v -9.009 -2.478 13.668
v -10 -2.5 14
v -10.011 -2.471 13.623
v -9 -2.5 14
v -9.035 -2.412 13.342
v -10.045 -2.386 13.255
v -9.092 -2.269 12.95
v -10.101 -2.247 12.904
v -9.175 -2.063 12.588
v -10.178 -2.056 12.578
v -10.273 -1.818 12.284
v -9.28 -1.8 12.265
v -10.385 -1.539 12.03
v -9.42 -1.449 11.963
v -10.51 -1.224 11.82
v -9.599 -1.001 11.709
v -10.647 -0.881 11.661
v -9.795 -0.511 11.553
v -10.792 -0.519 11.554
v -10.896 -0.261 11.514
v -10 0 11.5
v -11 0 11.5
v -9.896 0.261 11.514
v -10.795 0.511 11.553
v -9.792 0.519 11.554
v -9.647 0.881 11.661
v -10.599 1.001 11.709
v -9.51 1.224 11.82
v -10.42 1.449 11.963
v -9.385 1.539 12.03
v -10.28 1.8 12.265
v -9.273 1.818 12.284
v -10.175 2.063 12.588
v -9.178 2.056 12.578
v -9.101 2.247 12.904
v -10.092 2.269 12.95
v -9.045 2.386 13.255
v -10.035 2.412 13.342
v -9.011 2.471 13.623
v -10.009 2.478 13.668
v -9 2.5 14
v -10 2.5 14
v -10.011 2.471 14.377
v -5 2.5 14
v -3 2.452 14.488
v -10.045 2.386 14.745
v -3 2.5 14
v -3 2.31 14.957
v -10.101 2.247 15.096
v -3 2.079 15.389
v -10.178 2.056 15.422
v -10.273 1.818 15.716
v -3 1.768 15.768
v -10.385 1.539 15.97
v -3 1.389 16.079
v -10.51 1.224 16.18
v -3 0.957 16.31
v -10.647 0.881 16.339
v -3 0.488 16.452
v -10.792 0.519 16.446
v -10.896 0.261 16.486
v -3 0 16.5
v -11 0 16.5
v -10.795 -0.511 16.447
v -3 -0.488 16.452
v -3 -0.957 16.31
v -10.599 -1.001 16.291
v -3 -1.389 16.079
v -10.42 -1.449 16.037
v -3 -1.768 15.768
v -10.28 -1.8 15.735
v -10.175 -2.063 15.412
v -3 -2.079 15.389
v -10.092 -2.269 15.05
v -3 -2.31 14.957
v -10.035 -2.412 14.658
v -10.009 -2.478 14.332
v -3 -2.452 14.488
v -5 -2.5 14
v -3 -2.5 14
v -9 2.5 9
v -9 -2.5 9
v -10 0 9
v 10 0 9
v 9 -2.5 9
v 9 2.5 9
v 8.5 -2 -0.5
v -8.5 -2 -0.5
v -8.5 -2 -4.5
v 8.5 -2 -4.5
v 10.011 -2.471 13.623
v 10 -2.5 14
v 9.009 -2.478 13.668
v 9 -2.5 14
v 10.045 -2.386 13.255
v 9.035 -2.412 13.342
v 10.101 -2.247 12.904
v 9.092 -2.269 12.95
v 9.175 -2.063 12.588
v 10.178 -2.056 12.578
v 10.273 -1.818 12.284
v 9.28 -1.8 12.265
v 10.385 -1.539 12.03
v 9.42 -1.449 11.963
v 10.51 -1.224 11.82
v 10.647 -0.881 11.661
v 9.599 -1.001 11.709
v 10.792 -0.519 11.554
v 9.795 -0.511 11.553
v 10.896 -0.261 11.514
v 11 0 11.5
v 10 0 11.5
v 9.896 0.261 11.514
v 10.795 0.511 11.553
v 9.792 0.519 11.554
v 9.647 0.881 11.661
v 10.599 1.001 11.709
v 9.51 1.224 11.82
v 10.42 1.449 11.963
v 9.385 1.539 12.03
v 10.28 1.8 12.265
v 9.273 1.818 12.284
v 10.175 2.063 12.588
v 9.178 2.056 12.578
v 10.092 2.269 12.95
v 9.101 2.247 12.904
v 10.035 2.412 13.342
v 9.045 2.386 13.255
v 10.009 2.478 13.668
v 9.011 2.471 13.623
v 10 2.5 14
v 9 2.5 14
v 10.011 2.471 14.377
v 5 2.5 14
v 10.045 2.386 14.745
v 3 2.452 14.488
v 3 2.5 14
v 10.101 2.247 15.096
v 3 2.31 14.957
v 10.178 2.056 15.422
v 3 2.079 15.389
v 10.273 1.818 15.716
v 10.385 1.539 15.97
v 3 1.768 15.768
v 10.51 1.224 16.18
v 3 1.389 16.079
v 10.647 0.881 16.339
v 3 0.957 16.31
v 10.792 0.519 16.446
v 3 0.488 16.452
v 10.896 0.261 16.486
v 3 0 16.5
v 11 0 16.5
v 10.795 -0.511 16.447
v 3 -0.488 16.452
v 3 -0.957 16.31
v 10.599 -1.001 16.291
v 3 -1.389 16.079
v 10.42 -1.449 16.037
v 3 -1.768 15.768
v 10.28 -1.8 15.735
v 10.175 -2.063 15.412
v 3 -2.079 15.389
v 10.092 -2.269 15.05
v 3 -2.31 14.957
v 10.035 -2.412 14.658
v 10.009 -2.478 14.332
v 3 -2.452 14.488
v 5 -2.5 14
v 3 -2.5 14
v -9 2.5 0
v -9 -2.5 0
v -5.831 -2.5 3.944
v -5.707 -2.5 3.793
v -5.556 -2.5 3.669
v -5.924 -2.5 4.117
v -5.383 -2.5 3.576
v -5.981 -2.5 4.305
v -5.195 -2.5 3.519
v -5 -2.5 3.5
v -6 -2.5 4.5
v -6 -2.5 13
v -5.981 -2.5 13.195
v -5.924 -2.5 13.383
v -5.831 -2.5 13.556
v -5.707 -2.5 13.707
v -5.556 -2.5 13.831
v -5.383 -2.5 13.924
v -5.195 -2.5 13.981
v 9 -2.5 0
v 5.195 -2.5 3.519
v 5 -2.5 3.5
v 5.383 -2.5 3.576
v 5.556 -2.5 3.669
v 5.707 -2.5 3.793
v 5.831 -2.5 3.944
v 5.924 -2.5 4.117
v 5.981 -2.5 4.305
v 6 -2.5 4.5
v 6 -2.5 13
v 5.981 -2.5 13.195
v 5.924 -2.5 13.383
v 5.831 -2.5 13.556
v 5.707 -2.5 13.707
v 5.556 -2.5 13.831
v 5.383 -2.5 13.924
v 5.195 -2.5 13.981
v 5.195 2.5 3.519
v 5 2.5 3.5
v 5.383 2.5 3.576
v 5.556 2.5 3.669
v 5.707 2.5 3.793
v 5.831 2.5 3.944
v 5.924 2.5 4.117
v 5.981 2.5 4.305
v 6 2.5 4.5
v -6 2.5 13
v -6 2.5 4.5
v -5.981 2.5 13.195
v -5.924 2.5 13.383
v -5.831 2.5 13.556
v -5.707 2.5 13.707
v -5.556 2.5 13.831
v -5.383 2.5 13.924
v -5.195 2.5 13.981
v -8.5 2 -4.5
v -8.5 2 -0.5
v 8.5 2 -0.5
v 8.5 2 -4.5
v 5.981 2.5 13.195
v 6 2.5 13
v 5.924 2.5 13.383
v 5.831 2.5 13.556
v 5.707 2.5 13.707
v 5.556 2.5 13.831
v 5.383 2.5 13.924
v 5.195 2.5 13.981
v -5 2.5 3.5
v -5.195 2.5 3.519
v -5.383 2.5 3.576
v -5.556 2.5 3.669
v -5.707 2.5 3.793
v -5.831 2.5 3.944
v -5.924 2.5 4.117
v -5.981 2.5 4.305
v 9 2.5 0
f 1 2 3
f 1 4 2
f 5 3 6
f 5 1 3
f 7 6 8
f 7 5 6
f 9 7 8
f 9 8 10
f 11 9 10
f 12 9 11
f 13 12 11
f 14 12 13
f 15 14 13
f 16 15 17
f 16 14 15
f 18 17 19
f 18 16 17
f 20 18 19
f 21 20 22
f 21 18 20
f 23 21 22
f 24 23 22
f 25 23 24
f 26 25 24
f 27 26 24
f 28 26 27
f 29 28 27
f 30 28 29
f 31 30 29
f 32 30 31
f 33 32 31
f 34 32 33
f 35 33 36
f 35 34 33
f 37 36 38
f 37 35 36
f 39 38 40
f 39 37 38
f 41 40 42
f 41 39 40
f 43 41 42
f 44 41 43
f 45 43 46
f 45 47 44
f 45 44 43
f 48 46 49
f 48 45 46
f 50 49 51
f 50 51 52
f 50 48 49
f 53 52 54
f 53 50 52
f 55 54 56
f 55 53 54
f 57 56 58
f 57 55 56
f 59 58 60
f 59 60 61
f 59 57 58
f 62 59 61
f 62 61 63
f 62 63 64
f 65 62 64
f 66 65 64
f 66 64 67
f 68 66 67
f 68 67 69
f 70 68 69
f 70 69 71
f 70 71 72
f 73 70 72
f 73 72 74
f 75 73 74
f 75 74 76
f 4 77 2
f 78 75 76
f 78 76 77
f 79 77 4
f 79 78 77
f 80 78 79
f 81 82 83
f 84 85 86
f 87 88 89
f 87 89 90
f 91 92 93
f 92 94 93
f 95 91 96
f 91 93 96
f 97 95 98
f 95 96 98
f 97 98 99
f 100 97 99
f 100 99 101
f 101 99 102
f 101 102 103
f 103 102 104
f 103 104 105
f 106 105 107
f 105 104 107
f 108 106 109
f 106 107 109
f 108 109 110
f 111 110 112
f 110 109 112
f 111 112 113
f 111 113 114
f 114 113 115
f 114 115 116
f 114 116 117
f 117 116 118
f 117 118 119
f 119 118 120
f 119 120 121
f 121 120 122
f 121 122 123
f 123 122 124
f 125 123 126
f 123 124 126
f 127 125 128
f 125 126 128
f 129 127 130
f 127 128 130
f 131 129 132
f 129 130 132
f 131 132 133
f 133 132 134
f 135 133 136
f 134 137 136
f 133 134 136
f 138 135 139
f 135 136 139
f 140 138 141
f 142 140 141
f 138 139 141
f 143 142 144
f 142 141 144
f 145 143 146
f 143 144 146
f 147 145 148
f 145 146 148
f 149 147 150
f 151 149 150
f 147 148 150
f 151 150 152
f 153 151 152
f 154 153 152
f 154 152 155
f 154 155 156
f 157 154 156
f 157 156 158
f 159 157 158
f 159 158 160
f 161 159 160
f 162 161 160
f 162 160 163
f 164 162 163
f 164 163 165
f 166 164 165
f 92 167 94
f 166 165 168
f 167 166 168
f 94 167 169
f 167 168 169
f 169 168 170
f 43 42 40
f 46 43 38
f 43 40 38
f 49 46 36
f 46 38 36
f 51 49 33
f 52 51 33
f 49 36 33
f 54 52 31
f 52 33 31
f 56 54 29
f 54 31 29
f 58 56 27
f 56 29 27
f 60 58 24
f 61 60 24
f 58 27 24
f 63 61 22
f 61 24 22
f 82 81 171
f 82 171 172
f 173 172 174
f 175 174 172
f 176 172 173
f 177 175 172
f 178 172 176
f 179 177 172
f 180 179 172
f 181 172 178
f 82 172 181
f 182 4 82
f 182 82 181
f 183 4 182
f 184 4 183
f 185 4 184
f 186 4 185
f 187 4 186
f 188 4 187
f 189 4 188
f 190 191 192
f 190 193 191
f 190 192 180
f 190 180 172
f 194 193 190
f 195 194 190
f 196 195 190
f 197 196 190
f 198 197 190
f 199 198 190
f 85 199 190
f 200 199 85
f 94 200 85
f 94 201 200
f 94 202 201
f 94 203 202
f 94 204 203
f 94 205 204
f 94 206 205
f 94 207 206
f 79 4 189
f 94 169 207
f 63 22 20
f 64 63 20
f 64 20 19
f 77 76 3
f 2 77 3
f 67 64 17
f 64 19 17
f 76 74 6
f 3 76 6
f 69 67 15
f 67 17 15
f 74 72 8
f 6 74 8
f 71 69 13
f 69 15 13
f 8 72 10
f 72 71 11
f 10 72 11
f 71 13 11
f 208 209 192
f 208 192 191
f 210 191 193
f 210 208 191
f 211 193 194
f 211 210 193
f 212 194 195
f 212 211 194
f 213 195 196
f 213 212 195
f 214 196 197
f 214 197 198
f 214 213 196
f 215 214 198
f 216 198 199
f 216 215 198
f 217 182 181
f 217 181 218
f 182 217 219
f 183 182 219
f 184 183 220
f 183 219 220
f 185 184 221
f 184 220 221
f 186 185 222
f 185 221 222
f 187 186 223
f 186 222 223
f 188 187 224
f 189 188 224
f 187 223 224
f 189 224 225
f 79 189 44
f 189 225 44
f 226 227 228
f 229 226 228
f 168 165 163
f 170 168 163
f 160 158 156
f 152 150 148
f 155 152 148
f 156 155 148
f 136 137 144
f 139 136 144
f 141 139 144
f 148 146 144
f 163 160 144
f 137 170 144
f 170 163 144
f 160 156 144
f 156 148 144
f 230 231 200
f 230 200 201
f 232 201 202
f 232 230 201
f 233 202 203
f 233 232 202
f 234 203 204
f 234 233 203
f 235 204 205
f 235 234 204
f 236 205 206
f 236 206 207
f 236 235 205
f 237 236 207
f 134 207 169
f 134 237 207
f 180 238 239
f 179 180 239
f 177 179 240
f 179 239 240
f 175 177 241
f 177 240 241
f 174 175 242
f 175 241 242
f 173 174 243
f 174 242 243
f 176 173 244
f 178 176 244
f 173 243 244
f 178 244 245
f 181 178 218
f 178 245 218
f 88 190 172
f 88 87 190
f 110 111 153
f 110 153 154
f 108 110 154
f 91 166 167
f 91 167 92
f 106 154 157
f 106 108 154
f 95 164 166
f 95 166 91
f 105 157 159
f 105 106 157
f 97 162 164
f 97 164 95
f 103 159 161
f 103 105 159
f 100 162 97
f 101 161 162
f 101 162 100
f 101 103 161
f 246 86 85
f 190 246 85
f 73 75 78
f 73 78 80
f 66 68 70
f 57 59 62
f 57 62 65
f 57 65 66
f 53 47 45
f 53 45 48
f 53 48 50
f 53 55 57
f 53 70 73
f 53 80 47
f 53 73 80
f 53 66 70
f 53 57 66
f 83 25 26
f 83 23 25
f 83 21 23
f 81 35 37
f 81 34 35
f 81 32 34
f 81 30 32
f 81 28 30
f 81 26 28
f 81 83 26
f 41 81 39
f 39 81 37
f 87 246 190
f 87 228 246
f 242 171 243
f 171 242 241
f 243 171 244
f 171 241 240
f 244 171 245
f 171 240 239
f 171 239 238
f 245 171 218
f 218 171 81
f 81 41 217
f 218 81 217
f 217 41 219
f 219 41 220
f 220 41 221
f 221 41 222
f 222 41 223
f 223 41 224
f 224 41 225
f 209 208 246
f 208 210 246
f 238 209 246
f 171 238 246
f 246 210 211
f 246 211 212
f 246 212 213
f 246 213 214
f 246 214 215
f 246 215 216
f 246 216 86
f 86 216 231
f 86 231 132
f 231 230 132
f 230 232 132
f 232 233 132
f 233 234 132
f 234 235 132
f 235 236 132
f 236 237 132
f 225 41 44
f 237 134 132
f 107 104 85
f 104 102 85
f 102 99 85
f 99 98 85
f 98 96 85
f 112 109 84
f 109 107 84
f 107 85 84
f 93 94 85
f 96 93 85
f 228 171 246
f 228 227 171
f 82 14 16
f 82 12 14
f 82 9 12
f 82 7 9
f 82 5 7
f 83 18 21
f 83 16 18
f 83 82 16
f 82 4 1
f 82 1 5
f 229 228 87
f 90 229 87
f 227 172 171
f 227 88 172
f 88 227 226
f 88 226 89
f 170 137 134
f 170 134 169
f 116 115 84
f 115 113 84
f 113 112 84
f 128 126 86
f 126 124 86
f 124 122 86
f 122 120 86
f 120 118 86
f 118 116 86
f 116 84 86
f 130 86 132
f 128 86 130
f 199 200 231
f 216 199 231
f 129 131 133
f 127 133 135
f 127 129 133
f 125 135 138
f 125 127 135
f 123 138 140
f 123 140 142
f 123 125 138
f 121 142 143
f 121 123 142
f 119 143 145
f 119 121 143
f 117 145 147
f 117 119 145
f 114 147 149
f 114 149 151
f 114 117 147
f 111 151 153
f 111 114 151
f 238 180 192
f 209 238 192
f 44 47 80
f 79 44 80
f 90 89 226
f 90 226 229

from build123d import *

# Parameters (mm, degrees)
F2_DEPTH    = 2.5
F3_DEPTH    = 10
F4_DEPTH    = 3
F5_DEPTH    = 6
F6_T1_DEPTH = 5
F8_DEPTH    = 14
F9_DEPTH    = 9
F10_DEPTH   = 1
F11_DEPTH   = 16.5
F12_FACE_W  = 18
F12_FACE_H  = 5
F13_DEPTH   = 0.5
F13_TAPER   = 45
F14_DEPTH   = 4


# Not quite as in the source:
# - a fillet or chamfer that OpenCascade refuses, or shapes differently, is made with other operations: its cross-section is extruded or revolved along the edge and cut away or added


with BuildPart() as f2:
    # F0 (on Front) → F2 (new body, symmetric)
    with BuildSketch(Plane.XZ):
        Polygon((0, 3.5), (0, 0), (9, 0), (9, 14), (6, 14), (6, 3.5), align=None)
    extrude(amount=F2_DEPTH, both=True)

    # F1 (on Right) → F3 (join)
    with BuildSketch(Plane.YZ):
        with BuildLine():
            Line((-2.5, 14), (2.5, 14))
            ThreePointArc((2.5, 14), (0, 16.5), (-2.5, 14))
        make_face()
        with BuildLine():
            ThreePointArc((-2.5, 14), (0, 11.5), (2.5, 14))
            Line((2.5, 14), (-2.5, 14))
        make_face()
    extrude(amount=F3_DEPTH)

    # F1 (on Right) → F4 (cut)
    with BuildSketch(Plane.YZ):
        with BuildLine():
            Line((-2.5, 14), (2.5, 14))
            ThreePointArc((2.5, 14), (0, 16.5), (-2.5, 14))
        make_face()
        with BuildLine():
            ThreePointArc((-2.5, 14), (0, 11.5), (2.5, 14))
            Line((2.5, 14), (-2.5, 14))
        make_face()
    extrude(amount=F4_DEPTH, mode=Mode.SUBTRACT)

    # F1 (on Right) → F5 (cut)
    with BuildSketch(Plane.YZ):
        with BuildLine():
            ThreePointArc((-2.5, 14), (0, 11.5), (2.5, 14))
            Line((2.5, 14), (-2.5, 14))
        make_face()
    extrude(amount=F5_DEPTH, mode=Mode.SUBTRACT)

    # F6: fillet of radius 1 on 2 edges, made by hand

    # F6_s2 → F6_t1 (join)
    with BuildSketch(Plane.XZ.offset(-2.5)):
        with BuildLine():
            ThreePointArc((6, 13), (5.7071067812, 13.7071067812), (5, 14))
            Line((5, 14), (6, 14))
            Line((6, 14), (6, 13))
        make_face()
        with BuildLine():
            ThreePointArc((5, 3.5), (5.7071067812, 3.7928932188), (6, 4.5))
            Line((6, 4.5), (6, 3.5))
            Line((6, 3.5), (5, 3.5))
        make_face()
    extrude(amount=F6_T1_DEPTH)

    # F7 (on Top) → F8 (join)
    with BuildSketch(Plane.XY):
        Polygon((9, 2.5), (9, -2.5), (10, 0), align=None)
    extrude(amount=F8_DEPTH)

    # F7 (on Top) → F9 (cut)
    with BuildSketch(Plane.XY):
        Polygon((9, 2.5), (9, -2.5), (10, 0), align=None)
    extrude(amount=F9_DEPTH, mode=Mode.SUBTRACT)

    # F10 (add): a face of the model
    f10_faces = [f2.faces().sort_by_distance(p)[0] for p in [
        (10, -1.717766953, 12.282233047),
    ]]
    extrude(f10_faces, amount=F10_DEPTH)

    # F7 (on Top) → F11 (cut)
    with BuildSketch(Plane.XY):
        Polygon((11, 0), (10, -2.5), (11.5, -2.5), (11.5, 2.5), (10, 2.5), align=None)
    extrude(amount=F11_DEPTH, mode=Mode.SUBTRACT)

    # F12: F2 across face


with BuildPart() as f2_1:
    add(f2.part)
    add(f2.part.mirror(Plane(origin=(0, 0, 1.75), x_dir=(0, -1, 0), z_dir=(-1, 0, 0))))

    # F12_face (on face) → F13 (join)
    with BuildSketch(Plane(origin=(0, 0, 0), x_dir=(1, 0, 0), z_dir=(0, 0, -1))):
        Rectangle(F12_FACE_W, F12_FACE_H)
    extrude(amount=F13_DEPTH, taper=F13_TAPER)

    # F14 (add): a face of the model
    f14_faces = [f2_1.faces().sort_by_distance(p)[0] for p in [
        (0, 0, -0.5),
    ]]
    extrude(f14_faces, amount=F14_DEPTH)


solid = f2_1.part
